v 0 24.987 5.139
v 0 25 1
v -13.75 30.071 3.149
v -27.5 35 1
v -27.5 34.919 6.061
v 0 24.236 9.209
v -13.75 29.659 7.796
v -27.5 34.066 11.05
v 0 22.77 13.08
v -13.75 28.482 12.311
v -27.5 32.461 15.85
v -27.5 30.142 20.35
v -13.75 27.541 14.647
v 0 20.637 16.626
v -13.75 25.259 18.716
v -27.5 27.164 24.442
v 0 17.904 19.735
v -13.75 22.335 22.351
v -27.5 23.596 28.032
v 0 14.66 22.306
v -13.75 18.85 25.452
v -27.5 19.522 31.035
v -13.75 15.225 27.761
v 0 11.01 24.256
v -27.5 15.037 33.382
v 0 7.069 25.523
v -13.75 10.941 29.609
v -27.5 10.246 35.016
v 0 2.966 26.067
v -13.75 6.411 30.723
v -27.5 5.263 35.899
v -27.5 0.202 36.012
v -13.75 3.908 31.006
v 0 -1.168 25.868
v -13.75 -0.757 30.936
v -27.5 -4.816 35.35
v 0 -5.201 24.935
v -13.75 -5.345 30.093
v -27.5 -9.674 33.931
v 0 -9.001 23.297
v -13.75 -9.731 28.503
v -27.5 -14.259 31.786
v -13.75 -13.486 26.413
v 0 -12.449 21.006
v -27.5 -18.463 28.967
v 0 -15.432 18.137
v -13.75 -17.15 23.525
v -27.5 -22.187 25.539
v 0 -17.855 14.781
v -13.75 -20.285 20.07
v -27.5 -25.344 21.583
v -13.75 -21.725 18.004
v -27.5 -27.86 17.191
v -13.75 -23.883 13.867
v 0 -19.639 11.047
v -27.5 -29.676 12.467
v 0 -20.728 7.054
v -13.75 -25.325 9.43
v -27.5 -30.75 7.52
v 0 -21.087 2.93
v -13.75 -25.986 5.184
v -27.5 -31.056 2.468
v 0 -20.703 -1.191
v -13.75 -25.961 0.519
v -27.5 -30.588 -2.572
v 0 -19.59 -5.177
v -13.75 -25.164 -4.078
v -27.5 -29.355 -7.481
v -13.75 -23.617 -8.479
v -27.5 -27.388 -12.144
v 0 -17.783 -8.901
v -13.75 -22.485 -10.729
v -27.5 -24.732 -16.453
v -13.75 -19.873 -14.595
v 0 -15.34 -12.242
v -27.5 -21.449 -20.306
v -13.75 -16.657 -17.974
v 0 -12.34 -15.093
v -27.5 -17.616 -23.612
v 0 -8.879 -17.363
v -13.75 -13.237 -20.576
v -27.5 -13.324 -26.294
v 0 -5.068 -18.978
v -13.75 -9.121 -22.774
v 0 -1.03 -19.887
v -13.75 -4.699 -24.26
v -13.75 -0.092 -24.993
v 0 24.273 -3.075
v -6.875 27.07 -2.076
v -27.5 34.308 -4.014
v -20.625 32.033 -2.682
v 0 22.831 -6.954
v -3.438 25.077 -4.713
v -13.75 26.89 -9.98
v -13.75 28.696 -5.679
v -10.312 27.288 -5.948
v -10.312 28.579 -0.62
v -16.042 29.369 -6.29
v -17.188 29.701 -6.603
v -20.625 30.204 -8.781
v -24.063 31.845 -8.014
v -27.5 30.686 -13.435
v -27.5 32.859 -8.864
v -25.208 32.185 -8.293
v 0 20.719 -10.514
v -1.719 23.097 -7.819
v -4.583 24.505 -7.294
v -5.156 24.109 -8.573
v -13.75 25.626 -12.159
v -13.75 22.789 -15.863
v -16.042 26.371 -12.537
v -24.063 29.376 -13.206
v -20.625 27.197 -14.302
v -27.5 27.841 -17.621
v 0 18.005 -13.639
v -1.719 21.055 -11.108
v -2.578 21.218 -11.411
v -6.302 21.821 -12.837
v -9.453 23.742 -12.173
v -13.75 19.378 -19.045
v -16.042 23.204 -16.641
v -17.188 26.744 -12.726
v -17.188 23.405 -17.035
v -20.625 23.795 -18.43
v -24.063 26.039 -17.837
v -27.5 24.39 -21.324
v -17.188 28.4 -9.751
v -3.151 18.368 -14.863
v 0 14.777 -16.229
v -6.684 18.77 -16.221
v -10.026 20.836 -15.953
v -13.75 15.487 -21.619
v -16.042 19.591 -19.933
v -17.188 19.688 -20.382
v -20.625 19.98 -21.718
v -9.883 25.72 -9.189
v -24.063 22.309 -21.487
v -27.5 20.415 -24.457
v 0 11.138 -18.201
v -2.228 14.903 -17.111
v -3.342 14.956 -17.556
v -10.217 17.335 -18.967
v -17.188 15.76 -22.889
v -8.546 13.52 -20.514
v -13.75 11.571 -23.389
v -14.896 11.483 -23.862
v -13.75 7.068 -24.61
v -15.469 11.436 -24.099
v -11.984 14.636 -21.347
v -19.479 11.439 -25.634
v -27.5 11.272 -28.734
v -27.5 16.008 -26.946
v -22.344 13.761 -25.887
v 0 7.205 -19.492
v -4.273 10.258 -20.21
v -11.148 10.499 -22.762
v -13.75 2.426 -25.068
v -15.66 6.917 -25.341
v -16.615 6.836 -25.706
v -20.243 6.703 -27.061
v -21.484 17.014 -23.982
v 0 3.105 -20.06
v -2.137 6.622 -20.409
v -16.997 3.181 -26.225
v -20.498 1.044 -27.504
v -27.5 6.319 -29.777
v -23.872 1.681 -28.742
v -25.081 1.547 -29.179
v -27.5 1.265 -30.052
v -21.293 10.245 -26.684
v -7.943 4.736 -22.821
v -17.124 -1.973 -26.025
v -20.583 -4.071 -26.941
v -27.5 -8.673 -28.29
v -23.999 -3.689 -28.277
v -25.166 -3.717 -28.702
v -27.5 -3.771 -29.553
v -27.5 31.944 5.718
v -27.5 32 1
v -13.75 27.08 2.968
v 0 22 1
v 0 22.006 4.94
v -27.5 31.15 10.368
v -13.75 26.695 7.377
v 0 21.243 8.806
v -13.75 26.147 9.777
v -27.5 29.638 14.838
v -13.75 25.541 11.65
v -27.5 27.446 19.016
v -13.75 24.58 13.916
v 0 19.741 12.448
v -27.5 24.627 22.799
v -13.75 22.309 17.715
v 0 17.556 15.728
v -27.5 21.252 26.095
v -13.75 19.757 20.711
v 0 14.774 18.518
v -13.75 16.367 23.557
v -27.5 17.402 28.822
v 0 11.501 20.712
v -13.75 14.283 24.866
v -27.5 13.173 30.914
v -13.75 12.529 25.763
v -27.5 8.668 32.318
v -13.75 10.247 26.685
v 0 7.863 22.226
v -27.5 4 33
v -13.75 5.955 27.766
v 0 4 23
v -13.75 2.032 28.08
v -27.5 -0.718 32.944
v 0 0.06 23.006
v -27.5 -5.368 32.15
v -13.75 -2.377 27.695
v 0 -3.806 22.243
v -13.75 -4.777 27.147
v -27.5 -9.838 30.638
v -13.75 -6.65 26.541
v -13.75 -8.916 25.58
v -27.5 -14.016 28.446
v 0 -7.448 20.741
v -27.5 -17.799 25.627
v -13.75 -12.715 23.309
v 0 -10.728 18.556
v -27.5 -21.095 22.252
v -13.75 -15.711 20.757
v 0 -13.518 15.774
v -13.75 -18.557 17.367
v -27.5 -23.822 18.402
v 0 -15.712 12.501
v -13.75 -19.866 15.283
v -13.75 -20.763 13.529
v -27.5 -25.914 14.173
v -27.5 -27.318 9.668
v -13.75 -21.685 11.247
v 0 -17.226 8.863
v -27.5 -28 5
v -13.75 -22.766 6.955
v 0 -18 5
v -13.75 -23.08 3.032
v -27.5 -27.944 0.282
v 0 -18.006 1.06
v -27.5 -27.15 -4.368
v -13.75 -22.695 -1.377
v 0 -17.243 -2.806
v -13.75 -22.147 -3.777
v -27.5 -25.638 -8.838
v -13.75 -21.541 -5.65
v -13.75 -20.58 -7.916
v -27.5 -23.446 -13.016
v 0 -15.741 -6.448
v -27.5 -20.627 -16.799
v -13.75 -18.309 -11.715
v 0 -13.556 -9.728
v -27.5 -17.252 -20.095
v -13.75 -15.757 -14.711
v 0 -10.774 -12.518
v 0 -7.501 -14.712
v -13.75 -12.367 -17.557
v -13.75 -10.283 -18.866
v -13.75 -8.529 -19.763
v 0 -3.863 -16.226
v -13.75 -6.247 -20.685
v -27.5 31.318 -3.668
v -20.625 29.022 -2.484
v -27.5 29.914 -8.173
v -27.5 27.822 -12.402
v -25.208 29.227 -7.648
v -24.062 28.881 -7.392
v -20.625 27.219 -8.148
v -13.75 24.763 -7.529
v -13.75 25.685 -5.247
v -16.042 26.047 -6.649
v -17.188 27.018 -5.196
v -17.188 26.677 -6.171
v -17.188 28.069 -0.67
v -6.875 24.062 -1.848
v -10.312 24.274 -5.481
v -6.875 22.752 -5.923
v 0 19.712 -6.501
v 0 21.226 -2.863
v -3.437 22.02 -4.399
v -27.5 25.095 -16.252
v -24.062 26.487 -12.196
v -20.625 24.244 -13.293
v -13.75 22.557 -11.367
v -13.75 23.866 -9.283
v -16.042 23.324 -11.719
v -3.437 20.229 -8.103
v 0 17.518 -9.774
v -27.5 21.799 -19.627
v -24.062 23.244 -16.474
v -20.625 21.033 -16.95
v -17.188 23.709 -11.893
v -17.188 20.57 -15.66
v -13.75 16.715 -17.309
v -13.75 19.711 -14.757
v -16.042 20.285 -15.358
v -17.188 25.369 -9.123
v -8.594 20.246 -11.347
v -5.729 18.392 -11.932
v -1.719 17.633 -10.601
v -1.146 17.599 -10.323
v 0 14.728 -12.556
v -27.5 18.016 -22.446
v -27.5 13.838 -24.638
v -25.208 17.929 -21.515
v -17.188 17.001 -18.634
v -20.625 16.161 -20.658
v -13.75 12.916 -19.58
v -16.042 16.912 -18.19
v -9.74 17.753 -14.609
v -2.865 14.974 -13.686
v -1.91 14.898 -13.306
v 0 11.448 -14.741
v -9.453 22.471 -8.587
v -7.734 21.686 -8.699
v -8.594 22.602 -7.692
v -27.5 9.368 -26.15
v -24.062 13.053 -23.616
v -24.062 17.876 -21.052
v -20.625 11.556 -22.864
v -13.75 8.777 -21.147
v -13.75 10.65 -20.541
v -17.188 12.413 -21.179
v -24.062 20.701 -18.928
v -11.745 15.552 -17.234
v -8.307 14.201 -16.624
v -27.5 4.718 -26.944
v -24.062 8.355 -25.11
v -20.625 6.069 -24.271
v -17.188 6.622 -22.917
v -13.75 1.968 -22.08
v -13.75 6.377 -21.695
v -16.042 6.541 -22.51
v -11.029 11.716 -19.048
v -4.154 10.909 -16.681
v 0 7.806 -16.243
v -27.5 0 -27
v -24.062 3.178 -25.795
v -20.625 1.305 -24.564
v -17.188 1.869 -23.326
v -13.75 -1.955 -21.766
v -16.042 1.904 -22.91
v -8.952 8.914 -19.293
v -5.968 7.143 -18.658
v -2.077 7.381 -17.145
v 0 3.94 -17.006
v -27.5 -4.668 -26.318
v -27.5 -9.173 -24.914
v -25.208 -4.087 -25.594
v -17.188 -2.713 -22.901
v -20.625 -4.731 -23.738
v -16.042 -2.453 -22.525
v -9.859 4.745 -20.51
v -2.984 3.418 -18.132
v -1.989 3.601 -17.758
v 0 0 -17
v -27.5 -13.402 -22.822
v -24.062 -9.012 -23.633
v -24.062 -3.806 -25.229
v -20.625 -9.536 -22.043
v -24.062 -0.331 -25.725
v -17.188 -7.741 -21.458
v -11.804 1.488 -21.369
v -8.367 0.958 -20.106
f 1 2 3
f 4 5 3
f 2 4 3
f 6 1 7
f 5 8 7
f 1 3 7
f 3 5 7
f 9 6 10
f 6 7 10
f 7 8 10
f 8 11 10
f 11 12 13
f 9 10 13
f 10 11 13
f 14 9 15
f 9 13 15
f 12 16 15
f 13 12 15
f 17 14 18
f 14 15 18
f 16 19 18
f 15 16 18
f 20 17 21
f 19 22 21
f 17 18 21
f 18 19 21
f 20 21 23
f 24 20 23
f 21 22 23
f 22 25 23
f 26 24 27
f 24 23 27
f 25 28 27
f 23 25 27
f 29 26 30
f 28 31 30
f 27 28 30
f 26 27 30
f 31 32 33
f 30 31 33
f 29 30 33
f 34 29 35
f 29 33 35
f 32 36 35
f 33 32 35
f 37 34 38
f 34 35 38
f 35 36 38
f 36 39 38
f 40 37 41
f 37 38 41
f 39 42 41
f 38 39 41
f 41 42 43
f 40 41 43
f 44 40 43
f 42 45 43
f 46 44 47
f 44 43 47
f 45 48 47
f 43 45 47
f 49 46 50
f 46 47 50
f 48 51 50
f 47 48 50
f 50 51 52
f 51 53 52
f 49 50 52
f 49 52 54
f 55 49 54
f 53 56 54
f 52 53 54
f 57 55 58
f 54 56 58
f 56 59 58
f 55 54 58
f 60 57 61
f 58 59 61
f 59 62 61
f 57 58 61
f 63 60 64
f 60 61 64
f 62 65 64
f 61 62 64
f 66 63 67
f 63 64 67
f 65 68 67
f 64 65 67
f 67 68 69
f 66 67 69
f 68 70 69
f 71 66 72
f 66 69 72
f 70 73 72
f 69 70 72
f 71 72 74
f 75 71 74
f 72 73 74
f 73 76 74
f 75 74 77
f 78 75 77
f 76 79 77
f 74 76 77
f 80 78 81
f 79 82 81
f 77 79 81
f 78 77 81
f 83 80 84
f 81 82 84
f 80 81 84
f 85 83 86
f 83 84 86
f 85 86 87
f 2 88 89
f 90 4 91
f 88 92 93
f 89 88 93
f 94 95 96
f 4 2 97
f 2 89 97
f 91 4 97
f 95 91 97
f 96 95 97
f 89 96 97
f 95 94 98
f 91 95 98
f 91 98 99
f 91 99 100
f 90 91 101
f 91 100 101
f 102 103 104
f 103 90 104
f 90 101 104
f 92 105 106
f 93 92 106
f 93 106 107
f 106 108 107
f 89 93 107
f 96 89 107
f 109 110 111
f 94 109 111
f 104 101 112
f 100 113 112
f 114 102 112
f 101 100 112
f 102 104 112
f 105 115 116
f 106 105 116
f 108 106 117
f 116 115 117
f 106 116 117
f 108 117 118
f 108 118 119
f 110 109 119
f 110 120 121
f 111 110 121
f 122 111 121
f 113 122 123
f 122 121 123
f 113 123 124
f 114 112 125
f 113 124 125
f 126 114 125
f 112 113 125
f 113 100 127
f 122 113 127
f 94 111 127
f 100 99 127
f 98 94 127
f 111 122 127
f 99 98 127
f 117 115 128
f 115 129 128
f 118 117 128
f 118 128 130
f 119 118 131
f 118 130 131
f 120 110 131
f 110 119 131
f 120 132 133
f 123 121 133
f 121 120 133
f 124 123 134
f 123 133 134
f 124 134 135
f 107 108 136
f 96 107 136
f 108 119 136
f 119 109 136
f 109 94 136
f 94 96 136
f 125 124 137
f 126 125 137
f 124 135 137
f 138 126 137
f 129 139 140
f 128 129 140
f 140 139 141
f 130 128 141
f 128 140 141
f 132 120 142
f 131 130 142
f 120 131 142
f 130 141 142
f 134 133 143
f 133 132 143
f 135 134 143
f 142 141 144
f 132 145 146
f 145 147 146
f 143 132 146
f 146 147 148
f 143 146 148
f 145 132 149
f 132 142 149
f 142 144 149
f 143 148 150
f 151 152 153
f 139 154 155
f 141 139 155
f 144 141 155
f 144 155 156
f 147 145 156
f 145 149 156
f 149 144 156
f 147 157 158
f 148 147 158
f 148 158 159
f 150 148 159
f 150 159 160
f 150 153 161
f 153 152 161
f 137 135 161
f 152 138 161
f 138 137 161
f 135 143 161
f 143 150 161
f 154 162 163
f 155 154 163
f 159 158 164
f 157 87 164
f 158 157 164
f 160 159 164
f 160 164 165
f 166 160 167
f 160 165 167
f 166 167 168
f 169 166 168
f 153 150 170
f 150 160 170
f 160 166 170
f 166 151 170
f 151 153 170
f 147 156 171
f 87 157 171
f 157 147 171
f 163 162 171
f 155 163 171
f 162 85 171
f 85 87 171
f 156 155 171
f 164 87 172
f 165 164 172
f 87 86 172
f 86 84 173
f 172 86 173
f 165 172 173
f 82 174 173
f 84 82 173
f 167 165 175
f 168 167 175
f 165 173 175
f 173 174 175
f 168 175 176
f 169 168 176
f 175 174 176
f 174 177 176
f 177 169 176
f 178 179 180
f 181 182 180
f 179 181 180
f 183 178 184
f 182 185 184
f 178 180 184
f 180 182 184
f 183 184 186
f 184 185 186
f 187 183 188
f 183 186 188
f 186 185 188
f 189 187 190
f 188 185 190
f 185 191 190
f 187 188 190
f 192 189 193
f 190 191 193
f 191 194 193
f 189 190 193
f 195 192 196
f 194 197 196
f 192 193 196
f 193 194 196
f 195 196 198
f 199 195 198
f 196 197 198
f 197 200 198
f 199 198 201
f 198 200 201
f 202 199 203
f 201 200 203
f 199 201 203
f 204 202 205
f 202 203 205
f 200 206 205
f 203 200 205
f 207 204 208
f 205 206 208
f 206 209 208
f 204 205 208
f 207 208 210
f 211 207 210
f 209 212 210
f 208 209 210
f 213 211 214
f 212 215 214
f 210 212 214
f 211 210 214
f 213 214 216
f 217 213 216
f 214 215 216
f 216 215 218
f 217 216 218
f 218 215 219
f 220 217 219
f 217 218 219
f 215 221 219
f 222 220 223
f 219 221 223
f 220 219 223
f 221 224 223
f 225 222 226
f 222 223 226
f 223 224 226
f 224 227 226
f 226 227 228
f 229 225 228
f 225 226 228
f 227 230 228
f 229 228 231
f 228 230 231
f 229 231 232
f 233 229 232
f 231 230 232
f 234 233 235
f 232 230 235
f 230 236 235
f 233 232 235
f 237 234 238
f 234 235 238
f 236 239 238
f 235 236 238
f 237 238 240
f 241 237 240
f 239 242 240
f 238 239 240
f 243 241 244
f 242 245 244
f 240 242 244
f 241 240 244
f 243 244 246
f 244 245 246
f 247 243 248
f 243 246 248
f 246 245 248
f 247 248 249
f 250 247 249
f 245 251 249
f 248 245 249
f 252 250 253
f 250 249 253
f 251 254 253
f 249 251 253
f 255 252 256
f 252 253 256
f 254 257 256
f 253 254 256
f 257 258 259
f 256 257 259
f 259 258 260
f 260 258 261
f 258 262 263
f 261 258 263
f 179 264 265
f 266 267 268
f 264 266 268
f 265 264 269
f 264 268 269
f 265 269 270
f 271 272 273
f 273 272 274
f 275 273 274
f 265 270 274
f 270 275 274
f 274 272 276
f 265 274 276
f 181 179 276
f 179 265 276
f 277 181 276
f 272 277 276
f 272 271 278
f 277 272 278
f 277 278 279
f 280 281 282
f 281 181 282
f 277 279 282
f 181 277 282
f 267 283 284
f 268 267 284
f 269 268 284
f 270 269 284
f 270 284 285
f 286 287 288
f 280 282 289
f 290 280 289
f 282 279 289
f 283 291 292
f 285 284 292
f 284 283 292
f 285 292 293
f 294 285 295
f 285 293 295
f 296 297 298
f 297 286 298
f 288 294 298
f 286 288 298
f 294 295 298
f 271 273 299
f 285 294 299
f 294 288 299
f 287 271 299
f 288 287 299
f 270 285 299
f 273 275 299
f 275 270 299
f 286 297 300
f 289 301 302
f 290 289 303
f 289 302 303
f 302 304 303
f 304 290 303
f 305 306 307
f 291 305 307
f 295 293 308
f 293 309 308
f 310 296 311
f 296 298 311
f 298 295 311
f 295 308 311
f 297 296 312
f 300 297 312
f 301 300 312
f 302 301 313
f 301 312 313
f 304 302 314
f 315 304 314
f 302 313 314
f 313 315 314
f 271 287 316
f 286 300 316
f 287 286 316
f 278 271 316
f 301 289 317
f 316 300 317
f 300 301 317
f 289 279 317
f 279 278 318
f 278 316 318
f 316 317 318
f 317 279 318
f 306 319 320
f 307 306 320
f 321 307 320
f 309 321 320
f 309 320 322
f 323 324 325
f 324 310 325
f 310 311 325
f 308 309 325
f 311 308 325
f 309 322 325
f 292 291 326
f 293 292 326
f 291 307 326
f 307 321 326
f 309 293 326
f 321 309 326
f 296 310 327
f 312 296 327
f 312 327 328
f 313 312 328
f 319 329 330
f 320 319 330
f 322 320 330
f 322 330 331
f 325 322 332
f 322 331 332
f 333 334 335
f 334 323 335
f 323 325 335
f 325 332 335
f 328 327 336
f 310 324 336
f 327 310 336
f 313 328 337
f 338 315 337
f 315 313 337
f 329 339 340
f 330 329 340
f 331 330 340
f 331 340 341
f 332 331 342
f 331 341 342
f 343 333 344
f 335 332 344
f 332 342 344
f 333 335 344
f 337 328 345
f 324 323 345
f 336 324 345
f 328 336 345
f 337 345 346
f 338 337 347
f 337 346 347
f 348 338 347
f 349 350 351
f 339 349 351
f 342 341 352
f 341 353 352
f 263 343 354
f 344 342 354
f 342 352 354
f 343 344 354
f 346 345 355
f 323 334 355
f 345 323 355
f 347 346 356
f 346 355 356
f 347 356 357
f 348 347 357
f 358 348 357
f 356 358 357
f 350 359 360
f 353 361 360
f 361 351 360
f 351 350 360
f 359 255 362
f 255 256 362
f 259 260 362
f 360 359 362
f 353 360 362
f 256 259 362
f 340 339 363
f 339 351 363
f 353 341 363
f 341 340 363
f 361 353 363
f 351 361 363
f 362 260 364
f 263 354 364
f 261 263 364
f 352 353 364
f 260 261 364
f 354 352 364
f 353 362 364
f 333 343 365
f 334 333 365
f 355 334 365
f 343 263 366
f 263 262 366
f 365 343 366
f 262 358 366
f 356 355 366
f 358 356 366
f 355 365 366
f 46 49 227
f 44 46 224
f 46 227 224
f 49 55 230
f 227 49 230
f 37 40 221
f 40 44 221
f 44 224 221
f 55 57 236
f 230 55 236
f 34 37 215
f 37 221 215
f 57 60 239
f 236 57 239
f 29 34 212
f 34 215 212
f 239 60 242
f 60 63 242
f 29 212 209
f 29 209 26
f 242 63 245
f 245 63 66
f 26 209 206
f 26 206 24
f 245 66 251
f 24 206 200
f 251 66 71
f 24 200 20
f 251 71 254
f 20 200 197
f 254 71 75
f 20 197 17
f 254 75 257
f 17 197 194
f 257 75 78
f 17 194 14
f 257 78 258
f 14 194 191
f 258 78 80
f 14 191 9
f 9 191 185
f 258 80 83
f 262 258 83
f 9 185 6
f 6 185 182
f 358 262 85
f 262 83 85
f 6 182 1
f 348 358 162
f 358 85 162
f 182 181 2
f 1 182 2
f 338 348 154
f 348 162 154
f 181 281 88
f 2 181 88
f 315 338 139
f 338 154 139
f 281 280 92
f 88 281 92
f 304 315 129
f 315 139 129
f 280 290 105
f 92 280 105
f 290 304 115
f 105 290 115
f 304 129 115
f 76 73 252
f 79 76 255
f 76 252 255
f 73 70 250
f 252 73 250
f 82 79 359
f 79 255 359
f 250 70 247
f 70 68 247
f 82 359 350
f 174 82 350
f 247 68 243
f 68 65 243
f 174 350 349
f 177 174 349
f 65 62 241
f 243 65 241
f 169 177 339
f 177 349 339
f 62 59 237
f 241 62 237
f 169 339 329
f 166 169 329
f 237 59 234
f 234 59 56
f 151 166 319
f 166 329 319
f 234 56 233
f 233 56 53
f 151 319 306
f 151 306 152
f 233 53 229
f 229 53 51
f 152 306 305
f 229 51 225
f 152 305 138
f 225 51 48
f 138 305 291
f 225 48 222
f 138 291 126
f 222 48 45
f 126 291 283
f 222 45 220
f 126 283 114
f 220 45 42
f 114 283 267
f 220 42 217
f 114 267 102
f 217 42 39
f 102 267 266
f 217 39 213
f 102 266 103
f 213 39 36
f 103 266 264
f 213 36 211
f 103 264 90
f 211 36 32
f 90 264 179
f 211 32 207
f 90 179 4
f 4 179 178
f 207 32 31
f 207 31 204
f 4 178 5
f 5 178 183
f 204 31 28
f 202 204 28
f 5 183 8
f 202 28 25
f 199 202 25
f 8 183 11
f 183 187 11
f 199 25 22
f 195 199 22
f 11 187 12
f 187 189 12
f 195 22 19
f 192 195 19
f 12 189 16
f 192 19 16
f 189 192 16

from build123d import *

# Parameters (mm, degrees)
F1_DEPTH  = 7.5
F2_W      = 2.6
F2_H      = 4.75
F0_R      = 18.75
F4_DEPTH  = 2.375
F8_R      = 4
F9_W      = 7.5
F9_H      = 50
F10_DEPTH = 86


# Not quite as in the source:
# - a feature names something its author has since deleted; it is built from what else it names


with BuildPart() as f1:
    # F0 (on Right) → F1 (new body)
    with BuildSketch(Plane.YZ):
        with BuildLine():
            Line((-27.5, -30.8578620553), (-27.5, 35))
            Line((-27.5, 35), (-35, 35))
            Line((-35, 35), (-35, -33.3578620553))
            ThreePointArc((-35, -33.3578620553), (-32.0710678119, -40.4289298672), (-25, -43.3578620553))
            Line((-25, -43.3578620553), (25, -43.3578620553))
            ThreePointArc((25, -43.3578620553), (32.0710678119, -40.4289298672), (35, -33.3578620553))
            Line((35, -33.3578620553), (35, 35))
            Line((35, 35), (27.5, 35))
            Line((27.5, 35), (27.5, -30.8578620553))
            ThreePointArc((27.5, -30.8578620553), (26.0355339059, -34.3933959612), (22.5, -35.8578620553))
            Line((22.5, -35.8578620553), (-22.5, -35.8578620553))
            ThreePointArc((-22.5, -35.8578620553), (-26.0355339059, -34.3933959612), (-27.5, -30.8578620553))
        make_face()
    extrude(amount=F1_DEPTH)

    # F3: sweep along a path in F0
    with BuildLine(Plane.YZ) as f3_path:
        Line((27.5, 35), (27.5, -30.8578620553))
        ThreePointArc((27.5, -30.8578620553), (26.0355339059, -34.3933959612), (22.5, -35.8578620553))
        Line((22.5, -35.8578620553), (-22.5, -35.8578620553))
        ThreePointArc((-22.5, -35.8578620553), (-26.0355339059, -34.3933959612), (-27.5, -30.8578620553))
        Line((-27.5, -30.8578620553), (-27.5, 35))
    # F2 (on face) → F3 (sweep, cut)
    with BuildSketch(Plane.XY.offset(35)):
        with Locations((3.675, 29.875)):
            Rectangle(F2_W, F2_H)
    sweep(path=f3_path.line, mode=Mode.SUBTRACT)

    # F0 (on Right) → F4 (join)
    with BuildSketch(Plane.YZ):
        with BuildLine():
            Line((27.5, 35), (-27.5, 35))
            Line((-27.5, 35), (-27.5, -30.8578620553))
            ThreePointArc((-27.5, -30.8578620553), (-26.0355339059, -34.3933959612), (-22.5, -35.8578620553))
            Line((-22.5, -35.8578620553), (22.5, -35.8578620553))
            ThreePointArc((22.5, -35.8578620553), (26.0355339059, -34.3933959612), (27.5, -30.8578620553))
            Line((27.5, -30.8578620553), (27.5, 35))
        make_face()
        with Locations((2, 3)):
            Circle(F0_R, mode=Mode.SUBTRACT)
    extrude(amount=F4_DEPTH)

    # F6 (on offset) → F7 (revolve)
    with BuildSketch(Plane.XY.offset(1)):
        Polygon((0, 22), (0, 25), (-27.5, 35), (-27.5, 32), align=None)
    revolve(axis=Axis((0, 2, 3), (1, 0, 0)))

    # F8
    f8_edges = [f1.edges().sort_by_distance(p)[0] for p in [
        (6.2375, -27.5, 35),
        (6.2375, 27.5, 35),
    ]]
    fillet(f8_edges, radius=F8_R)

    # F9 (on face) → F10 (cut)
    with BuildSketch(Plane(origin=(0, 0, -43.3578620553), x_dir=(1, 0, 0), z_dir=(0, 0, -1))):
        Polygon((0, -25), (0, -46.4285723865), (9.4410963356, -46.4285723865), (9.4410963356, 44.8143593967), (0, 44.8143593967), (0, 25), (7.5, 25), (7.5, -25), align=None)
        with Locations((3.75, 0)):
            Rectangle(F9_W, F9_H)
    extrude(amount=-F10_DEPTH, mode=Mode.SUBTRACT)


solid = f1.part
